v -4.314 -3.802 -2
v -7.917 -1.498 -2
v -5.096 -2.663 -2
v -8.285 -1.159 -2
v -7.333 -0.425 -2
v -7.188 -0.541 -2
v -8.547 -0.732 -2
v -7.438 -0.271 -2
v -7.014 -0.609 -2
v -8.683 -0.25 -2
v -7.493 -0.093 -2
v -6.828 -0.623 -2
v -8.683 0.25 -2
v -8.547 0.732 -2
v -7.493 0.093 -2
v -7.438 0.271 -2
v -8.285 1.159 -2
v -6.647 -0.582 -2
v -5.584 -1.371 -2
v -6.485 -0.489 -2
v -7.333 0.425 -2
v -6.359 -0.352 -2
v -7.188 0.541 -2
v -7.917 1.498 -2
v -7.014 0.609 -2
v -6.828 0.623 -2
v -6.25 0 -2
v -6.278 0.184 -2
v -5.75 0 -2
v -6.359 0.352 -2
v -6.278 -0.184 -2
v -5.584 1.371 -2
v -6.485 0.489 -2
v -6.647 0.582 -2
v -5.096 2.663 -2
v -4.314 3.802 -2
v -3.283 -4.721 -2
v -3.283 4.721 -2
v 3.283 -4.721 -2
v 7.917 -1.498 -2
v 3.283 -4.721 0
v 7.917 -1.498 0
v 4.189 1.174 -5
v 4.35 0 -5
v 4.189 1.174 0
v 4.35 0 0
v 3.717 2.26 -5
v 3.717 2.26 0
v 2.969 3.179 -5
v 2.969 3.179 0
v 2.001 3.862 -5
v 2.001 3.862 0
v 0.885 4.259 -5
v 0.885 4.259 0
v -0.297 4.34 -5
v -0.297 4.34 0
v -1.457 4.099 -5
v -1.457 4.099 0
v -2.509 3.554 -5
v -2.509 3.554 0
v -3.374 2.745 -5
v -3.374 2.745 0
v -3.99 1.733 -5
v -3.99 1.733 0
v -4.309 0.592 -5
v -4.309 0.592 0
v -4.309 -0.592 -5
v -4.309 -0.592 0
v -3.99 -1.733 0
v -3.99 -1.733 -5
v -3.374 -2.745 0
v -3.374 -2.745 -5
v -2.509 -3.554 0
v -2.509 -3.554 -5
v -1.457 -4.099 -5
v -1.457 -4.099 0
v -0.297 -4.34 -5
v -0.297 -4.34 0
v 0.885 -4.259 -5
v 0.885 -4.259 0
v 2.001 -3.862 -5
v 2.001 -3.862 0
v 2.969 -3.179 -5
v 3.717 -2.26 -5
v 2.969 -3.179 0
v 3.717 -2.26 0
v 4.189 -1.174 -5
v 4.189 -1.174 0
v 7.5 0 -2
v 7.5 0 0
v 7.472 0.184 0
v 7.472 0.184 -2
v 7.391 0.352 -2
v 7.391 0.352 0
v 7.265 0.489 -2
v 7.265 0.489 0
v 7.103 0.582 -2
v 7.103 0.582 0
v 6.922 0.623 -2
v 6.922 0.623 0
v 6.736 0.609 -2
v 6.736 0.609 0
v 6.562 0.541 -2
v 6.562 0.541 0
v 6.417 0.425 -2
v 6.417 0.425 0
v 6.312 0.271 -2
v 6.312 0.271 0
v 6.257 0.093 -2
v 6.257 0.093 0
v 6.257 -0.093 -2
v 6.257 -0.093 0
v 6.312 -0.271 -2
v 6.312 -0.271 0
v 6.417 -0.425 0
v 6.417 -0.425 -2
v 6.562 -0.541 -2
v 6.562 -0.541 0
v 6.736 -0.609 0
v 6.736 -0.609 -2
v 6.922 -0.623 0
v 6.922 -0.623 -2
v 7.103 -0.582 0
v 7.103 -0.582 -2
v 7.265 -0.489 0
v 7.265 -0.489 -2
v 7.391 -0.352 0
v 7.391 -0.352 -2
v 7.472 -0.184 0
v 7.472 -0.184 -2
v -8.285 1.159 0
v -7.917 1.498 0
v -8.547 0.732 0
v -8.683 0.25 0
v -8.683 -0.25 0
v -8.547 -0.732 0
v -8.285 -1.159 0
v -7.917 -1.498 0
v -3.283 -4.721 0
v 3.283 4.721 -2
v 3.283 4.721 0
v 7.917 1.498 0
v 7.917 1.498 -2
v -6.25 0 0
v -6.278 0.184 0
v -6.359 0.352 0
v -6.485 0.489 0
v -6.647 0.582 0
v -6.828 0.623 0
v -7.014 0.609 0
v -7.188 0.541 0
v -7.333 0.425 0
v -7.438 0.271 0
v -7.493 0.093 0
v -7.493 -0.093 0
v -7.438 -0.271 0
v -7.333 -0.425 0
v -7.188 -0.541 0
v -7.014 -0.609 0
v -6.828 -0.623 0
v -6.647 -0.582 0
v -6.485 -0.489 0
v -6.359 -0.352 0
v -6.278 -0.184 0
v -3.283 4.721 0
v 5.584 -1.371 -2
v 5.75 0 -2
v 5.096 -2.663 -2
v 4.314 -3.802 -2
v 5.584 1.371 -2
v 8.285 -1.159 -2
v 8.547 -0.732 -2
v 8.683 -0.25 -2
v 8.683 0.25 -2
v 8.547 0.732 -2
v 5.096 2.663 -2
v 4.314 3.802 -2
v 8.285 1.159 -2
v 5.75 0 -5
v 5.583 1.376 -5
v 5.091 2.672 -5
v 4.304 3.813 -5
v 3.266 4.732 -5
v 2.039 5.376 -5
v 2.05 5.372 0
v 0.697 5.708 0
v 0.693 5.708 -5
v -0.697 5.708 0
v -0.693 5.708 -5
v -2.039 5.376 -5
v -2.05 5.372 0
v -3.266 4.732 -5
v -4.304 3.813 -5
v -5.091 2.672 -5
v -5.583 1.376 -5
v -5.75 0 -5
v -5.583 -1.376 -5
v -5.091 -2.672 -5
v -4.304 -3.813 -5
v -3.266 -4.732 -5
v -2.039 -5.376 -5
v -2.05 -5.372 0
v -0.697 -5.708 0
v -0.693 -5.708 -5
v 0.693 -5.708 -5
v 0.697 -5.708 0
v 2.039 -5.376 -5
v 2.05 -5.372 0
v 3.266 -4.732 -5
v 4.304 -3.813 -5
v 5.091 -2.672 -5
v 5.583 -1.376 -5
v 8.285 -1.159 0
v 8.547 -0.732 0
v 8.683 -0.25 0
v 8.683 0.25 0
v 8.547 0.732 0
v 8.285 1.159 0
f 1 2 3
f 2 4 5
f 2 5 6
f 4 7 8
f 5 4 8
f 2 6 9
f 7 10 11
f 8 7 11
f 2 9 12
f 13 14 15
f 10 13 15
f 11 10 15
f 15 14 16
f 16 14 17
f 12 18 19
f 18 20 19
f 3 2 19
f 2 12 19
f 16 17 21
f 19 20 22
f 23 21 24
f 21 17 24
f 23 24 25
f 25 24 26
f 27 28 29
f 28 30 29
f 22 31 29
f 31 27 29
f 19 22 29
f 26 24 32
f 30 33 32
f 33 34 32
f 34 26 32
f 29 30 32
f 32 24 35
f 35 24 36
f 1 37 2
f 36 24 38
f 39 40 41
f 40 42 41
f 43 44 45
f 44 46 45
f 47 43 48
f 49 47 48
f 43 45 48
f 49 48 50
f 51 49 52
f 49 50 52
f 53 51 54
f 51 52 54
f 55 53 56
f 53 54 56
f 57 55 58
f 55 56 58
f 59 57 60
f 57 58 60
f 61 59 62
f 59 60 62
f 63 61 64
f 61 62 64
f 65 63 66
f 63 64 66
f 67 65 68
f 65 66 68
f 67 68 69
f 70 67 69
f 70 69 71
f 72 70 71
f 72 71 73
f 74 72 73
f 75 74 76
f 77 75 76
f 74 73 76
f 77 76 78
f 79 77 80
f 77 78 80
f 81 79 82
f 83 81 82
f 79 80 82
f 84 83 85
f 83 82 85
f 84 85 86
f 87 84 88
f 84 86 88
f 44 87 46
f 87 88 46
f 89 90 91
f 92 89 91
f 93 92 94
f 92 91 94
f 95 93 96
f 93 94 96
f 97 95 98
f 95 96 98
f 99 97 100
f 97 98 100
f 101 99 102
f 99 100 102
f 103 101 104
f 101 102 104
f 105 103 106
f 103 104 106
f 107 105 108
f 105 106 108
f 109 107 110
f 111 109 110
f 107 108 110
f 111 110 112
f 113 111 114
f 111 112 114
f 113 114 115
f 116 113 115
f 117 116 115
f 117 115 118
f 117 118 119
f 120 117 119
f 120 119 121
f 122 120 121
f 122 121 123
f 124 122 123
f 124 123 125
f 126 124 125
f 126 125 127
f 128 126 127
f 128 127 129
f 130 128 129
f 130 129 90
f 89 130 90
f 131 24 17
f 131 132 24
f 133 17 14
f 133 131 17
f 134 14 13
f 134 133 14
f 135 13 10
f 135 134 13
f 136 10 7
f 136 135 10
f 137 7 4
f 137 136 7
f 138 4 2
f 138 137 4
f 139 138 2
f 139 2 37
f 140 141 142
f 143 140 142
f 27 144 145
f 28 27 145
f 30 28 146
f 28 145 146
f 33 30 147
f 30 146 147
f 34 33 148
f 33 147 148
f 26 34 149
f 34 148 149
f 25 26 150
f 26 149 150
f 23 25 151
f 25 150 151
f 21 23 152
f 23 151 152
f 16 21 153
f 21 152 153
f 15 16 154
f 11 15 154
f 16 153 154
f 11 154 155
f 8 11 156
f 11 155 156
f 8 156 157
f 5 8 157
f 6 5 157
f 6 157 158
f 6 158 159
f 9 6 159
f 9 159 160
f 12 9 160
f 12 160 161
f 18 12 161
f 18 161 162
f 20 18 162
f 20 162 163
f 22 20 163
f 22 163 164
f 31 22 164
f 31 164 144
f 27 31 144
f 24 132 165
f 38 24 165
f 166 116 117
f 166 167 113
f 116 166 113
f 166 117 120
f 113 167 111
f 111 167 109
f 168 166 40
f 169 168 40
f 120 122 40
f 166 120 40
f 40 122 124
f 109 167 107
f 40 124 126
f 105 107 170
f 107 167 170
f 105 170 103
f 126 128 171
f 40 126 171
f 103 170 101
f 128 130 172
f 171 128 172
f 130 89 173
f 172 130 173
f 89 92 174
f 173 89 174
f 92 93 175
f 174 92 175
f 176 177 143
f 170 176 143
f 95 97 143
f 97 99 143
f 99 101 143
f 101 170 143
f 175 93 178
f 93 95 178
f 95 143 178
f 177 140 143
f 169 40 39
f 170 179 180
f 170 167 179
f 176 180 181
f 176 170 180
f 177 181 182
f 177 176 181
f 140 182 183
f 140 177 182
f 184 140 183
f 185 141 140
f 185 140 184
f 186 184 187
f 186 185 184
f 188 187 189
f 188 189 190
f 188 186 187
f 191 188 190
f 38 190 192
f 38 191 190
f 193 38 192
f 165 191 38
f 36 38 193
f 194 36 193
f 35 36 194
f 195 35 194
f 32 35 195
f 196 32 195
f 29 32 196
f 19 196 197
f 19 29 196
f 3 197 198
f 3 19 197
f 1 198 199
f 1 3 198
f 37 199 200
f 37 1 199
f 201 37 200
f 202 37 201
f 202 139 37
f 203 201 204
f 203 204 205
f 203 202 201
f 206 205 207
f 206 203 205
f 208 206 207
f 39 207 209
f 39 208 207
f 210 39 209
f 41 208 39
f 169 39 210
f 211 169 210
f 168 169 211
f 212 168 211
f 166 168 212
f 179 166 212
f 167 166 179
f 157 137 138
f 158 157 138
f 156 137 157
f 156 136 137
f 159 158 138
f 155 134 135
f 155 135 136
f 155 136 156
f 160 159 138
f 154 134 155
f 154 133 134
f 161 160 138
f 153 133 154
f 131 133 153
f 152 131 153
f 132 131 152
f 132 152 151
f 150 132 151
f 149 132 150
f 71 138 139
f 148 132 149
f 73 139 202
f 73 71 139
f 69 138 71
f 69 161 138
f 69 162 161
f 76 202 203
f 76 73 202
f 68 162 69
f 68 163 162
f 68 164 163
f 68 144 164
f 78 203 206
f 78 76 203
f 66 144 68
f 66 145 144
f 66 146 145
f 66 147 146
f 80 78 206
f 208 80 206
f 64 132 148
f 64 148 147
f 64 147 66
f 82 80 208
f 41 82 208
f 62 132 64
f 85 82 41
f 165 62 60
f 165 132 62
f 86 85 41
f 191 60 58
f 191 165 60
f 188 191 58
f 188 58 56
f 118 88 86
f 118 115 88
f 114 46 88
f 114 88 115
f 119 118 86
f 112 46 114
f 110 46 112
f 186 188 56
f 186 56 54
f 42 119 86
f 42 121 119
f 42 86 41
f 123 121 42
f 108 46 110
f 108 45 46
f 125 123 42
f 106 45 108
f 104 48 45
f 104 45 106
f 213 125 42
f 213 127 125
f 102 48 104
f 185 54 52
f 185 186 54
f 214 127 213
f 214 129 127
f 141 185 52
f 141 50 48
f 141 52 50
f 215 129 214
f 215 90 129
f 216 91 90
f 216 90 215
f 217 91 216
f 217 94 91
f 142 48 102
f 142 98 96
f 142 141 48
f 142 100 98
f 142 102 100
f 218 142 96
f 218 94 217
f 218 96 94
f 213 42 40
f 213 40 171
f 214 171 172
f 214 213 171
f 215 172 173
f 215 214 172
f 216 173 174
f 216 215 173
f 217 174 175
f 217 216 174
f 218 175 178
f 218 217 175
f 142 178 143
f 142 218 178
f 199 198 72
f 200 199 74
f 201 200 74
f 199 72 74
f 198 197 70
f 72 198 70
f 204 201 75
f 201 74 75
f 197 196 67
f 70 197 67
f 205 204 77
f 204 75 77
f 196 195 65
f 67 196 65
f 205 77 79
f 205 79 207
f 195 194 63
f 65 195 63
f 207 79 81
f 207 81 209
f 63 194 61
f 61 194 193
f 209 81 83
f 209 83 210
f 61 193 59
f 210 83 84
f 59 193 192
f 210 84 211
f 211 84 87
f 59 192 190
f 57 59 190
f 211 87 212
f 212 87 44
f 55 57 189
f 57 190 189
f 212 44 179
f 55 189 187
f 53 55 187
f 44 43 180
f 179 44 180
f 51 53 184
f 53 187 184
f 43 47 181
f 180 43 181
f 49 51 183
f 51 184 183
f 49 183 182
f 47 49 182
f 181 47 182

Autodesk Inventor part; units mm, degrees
ref_plane "YZ Plane" through (0, 0, 0) normal (1, 0, 0) x (0, 1, 0)
ref_plane "XZ Plane" through (0, 0, 0) normal (0, 1, 0) x (-1, 0, 0)
ref_plane "XY Plane" through (0, 0, 0) normal (0, 0, 1) x (1, 0, 0)
sketch "スケッチ1" plane through (0, 0, 0) normal (0, 0, 1) x (1, 0, 0)
  circle A0 centre (0, 0) radius 2.25 construction
  circle A1 centre (0, 0) radius 4.35
  circle A2 centre (0, 0) radius 5.75
  circle A3 centre (-6.875, 0) radius 0.625
  circle A4 centre (6.875, 0) radius 0.625
  circle A5 centre (0, 0) radius 6.875 construction
  circle A6 centre (-6.875, 0) radius 1.825
  circle A7 centre (6.875, 0) radius 1.825
  line L0 (-7.9169, 1.4983) -> (-3.2827, 4.7208)
  line L1 (-7.9169, -1.4983) -> (-3.2827, -4.7208)
  line L2 (7.9169, -1.4983) -> (3.2827, -4.7208)
  line L3 (3.2827, 4.7208) -> (7.9169, 1.4983)
  line L4 (6.875, 0) -> (0, 0) construction
  line L5 (0, 0) -> (-6.875, 0) construction
  circle A8 centre (0, 0) radius 4.25
  point P0 (5.5998, -1.3056)
  point P1 (5.5998, 1.3056)
  point P2 (-5.5998, 1.3056)
  point P3 (-5.5998, -1.3056)
  dimension "d2" = 4.5
  dimension "d5" = 1.25
  dimension "d6" = 1.25
  dimension "d7" = 1.2
  dimension "d8" = 1.2
  dimension "d9" = 0.5
  dimension "d18" = 180
  dimension "d22" = 13.75
  dimension "d23" = 0.1
  dimension "d24" = 8.5
  dimension "d25" = 1.5
extrude "押し出し1" add sketch "スケッチ1" against normal blind 5 contours A2 A7 A6 | A2 A7 | A6 A2 picked at (5.515, -0.2153) picked at (-5.5055, 0)
extrude "押し出し3" add sketch "スケッチ1" against normal blind 2 contours A2 A6 L0 | A2 A6 | A2 L1 A6 picked at (-5.951, -0.7528)
extrude "押し出し4" add sketch "スケッチ1" against normal blind 2 contours L3 A7 A2 | A7 A2 | A7 L2 A2 picked at (6.0448, 0.9837)
equation "\"d6\" = d5"
equation "\"d8\" = d7"
properties part number "motorauxiliary"
